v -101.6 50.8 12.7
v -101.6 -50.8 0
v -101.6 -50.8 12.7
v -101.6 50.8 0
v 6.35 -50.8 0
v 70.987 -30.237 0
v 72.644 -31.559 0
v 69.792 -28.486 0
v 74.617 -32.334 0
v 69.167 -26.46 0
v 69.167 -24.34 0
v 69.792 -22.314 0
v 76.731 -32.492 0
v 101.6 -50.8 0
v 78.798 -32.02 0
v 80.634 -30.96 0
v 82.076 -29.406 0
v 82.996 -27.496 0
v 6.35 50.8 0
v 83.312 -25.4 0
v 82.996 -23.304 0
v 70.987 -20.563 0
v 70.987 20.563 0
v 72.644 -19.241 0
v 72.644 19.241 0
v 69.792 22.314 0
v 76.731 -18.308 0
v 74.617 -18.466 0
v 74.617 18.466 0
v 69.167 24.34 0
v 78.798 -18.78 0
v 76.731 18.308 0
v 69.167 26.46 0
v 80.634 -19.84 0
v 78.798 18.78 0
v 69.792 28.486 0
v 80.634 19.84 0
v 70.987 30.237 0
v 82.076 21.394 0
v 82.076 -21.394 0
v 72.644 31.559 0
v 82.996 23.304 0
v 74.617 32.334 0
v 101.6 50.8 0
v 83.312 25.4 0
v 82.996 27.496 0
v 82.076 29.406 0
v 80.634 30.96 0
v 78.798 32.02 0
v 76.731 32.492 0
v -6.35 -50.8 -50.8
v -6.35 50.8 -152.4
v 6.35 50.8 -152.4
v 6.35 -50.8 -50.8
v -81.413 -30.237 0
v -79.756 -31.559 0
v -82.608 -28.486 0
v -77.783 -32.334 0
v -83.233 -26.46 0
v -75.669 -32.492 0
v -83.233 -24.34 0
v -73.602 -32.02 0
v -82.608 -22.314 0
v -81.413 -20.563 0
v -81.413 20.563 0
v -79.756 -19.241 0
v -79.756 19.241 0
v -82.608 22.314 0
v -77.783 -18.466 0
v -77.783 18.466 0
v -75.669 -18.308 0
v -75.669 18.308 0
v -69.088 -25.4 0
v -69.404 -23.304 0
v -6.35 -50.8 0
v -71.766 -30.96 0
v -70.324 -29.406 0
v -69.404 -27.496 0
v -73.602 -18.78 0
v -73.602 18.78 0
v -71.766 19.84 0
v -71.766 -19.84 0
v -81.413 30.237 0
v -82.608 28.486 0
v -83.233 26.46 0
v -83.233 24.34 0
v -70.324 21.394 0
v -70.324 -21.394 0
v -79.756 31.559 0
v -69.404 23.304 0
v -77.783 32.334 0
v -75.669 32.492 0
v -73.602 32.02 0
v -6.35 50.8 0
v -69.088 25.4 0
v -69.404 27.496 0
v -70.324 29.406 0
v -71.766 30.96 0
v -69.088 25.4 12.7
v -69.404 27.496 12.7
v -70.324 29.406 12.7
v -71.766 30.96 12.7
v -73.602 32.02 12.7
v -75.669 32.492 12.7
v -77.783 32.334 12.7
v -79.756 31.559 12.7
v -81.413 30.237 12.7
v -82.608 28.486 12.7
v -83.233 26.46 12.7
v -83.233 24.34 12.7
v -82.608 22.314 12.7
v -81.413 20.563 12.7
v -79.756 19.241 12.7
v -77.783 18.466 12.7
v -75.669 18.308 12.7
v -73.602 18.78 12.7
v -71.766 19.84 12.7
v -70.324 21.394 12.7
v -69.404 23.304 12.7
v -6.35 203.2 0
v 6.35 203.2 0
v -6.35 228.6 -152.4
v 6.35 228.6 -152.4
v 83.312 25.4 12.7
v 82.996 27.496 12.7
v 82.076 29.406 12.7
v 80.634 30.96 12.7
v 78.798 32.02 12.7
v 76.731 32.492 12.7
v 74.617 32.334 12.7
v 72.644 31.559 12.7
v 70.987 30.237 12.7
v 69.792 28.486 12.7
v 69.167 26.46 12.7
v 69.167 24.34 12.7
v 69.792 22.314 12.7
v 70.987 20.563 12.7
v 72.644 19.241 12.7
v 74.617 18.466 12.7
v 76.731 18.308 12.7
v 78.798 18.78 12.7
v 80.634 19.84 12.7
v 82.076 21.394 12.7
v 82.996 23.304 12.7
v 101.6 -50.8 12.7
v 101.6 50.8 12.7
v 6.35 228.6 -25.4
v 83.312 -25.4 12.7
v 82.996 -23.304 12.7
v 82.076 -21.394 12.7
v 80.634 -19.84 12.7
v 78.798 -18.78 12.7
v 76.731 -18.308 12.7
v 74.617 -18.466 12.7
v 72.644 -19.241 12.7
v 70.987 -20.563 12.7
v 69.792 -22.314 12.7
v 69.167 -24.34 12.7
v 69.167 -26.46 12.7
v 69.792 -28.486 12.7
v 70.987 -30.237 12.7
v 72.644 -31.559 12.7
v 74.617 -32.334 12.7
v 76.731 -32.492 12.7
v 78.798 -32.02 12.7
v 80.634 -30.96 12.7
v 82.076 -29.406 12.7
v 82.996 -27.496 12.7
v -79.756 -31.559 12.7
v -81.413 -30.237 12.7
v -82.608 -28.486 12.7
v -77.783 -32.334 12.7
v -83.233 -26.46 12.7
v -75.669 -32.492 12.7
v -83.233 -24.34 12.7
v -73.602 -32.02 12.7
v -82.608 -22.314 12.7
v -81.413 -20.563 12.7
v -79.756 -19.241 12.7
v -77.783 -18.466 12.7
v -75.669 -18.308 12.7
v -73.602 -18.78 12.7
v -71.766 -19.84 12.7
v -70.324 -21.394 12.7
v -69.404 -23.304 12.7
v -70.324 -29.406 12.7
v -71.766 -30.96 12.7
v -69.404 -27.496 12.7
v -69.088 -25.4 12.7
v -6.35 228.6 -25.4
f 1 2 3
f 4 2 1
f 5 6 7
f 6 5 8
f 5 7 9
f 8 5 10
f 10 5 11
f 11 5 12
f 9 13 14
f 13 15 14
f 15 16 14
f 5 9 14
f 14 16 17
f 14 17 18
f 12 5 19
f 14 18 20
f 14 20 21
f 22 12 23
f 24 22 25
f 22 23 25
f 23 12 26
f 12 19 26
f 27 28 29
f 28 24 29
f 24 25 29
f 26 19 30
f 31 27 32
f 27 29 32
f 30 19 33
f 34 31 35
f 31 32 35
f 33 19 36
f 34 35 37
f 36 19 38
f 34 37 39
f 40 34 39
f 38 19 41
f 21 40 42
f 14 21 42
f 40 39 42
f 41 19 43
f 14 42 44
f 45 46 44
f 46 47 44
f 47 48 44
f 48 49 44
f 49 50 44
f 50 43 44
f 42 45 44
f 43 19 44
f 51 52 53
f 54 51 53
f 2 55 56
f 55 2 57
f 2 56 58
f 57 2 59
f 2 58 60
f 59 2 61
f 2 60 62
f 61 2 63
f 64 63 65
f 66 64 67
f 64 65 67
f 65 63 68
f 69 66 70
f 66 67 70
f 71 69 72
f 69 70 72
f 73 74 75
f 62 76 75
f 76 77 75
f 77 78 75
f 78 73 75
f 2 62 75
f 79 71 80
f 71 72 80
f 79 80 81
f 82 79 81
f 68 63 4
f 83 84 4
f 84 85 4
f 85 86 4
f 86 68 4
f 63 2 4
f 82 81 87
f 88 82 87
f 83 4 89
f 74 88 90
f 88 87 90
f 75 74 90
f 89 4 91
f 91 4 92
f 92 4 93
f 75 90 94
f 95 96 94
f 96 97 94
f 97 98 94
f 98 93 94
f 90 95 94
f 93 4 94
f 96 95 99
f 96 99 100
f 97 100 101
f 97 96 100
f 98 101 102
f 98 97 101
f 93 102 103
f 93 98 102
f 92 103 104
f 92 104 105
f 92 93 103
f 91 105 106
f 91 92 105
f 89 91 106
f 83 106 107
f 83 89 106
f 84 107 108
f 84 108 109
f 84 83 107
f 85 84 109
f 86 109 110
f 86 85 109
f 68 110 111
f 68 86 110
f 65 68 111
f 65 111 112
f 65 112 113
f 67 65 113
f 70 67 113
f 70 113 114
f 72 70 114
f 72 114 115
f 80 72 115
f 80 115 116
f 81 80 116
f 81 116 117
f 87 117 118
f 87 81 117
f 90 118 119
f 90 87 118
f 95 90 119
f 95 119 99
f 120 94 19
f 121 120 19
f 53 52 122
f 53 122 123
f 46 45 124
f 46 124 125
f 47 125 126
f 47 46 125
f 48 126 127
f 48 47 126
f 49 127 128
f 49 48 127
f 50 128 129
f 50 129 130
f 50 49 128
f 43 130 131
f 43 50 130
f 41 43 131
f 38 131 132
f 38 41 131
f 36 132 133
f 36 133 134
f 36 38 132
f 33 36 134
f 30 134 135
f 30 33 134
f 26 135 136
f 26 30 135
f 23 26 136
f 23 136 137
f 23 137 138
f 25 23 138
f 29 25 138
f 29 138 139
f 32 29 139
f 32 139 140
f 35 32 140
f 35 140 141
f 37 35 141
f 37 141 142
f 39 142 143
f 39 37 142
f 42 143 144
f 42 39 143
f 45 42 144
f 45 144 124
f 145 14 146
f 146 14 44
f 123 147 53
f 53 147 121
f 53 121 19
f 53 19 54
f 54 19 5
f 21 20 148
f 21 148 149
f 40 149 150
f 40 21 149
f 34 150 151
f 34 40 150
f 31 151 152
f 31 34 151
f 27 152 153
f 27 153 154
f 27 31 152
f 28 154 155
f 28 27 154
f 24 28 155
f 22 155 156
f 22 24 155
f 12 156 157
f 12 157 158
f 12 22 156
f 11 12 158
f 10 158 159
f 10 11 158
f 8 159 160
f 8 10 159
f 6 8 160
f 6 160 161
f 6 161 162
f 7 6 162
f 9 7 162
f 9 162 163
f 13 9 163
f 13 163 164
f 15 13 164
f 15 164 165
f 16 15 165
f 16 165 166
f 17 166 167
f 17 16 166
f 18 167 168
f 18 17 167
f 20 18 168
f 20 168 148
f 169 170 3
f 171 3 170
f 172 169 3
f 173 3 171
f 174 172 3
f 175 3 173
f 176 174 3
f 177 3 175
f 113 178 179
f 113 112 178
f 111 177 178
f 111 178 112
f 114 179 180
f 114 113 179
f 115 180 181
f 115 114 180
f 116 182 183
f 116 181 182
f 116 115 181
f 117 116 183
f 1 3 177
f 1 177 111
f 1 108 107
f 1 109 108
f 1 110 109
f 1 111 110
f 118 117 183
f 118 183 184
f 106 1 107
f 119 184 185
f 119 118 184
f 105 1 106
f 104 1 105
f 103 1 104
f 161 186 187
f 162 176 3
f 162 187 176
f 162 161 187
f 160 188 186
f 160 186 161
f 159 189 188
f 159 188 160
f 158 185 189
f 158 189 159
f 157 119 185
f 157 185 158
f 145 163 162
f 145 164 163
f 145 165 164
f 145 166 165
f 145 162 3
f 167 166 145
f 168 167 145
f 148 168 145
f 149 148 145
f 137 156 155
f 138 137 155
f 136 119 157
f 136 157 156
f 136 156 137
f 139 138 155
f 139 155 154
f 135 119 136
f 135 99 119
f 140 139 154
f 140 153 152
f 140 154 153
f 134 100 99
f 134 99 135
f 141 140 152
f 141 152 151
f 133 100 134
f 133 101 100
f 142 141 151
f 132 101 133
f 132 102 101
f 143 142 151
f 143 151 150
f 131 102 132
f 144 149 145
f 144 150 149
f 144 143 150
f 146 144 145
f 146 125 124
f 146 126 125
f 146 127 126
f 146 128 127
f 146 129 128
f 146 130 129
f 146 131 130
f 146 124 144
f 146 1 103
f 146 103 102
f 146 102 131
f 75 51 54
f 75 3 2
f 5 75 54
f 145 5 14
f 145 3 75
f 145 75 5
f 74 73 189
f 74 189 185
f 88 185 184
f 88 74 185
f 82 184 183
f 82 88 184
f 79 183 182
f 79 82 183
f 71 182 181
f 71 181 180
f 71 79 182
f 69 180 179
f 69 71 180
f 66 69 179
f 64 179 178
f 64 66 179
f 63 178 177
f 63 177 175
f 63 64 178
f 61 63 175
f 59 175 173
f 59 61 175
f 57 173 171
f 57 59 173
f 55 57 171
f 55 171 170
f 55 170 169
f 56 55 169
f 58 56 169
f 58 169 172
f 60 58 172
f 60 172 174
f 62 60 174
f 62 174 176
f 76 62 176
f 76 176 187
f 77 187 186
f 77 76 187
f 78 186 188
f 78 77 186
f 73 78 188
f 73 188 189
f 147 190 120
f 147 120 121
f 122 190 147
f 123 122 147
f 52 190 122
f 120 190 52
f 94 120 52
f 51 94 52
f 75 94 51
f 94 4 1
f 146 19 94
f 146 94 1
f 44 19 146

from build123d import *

# Parameters (mm, degrees)
F0_W     = 203.2
F0_H     = 101.6
F0_R     = 7.112
F1_DEPTH = 12.7
F2_W     = 12.7
F2_H     = 279.4
F3_DEPTH = 152.4
F4_SIZE  = 101.6
F5_SIZE  = 25.4


with BuildPart() as f1:
    # F0 (on Top) → F1 (new body)
    with BuildSketch(Plane.XY):
        Rectangle(F0_W, F0_H)
        with Locations((-76.2, -25.4)):
            Circle(F0_R, mode=Mode.SUBTRACT)
        with Locations((76.2, -25.4)):
            Circle(F0_R, mode=Mode.SUBTRACT)
        with Locations((-76.2, 25.4)):
            Circle(F0_R, mode=Mode.SUBTRACT)
        with Locations((76.2, 25.4)):
            Circle(F0_R, mode=Mode.SUBTRACT)
    extrude(amount=F1_DEPTH)

    # F2 (on face) → F3 (join)
    with BuildSketch(Plane(origin=(0, 0, 0), x_dir=(1, 0, 0), z_dir=(0, 0, -1))):
        with Locations((0, -88.9)):
            Rectangle(F2_W, F2_H)
    extrude(amount=F3_DEPTH)

    # F4
    f4_edges = [f1.edges().sort_by_distance(p)[0] for p in [
        (0, -50.8, -152.4),
    ]]
    chamfer(f4_edges, length=F4_SIZE)

    # F5
    f5_edges = [f1.edges().sort_by_distance(p)[0] for p in [
        (0, 228.6, 0),
    ]]
    chamfer(f5_edges, length=F5_SIZE)


solid = f1.part
